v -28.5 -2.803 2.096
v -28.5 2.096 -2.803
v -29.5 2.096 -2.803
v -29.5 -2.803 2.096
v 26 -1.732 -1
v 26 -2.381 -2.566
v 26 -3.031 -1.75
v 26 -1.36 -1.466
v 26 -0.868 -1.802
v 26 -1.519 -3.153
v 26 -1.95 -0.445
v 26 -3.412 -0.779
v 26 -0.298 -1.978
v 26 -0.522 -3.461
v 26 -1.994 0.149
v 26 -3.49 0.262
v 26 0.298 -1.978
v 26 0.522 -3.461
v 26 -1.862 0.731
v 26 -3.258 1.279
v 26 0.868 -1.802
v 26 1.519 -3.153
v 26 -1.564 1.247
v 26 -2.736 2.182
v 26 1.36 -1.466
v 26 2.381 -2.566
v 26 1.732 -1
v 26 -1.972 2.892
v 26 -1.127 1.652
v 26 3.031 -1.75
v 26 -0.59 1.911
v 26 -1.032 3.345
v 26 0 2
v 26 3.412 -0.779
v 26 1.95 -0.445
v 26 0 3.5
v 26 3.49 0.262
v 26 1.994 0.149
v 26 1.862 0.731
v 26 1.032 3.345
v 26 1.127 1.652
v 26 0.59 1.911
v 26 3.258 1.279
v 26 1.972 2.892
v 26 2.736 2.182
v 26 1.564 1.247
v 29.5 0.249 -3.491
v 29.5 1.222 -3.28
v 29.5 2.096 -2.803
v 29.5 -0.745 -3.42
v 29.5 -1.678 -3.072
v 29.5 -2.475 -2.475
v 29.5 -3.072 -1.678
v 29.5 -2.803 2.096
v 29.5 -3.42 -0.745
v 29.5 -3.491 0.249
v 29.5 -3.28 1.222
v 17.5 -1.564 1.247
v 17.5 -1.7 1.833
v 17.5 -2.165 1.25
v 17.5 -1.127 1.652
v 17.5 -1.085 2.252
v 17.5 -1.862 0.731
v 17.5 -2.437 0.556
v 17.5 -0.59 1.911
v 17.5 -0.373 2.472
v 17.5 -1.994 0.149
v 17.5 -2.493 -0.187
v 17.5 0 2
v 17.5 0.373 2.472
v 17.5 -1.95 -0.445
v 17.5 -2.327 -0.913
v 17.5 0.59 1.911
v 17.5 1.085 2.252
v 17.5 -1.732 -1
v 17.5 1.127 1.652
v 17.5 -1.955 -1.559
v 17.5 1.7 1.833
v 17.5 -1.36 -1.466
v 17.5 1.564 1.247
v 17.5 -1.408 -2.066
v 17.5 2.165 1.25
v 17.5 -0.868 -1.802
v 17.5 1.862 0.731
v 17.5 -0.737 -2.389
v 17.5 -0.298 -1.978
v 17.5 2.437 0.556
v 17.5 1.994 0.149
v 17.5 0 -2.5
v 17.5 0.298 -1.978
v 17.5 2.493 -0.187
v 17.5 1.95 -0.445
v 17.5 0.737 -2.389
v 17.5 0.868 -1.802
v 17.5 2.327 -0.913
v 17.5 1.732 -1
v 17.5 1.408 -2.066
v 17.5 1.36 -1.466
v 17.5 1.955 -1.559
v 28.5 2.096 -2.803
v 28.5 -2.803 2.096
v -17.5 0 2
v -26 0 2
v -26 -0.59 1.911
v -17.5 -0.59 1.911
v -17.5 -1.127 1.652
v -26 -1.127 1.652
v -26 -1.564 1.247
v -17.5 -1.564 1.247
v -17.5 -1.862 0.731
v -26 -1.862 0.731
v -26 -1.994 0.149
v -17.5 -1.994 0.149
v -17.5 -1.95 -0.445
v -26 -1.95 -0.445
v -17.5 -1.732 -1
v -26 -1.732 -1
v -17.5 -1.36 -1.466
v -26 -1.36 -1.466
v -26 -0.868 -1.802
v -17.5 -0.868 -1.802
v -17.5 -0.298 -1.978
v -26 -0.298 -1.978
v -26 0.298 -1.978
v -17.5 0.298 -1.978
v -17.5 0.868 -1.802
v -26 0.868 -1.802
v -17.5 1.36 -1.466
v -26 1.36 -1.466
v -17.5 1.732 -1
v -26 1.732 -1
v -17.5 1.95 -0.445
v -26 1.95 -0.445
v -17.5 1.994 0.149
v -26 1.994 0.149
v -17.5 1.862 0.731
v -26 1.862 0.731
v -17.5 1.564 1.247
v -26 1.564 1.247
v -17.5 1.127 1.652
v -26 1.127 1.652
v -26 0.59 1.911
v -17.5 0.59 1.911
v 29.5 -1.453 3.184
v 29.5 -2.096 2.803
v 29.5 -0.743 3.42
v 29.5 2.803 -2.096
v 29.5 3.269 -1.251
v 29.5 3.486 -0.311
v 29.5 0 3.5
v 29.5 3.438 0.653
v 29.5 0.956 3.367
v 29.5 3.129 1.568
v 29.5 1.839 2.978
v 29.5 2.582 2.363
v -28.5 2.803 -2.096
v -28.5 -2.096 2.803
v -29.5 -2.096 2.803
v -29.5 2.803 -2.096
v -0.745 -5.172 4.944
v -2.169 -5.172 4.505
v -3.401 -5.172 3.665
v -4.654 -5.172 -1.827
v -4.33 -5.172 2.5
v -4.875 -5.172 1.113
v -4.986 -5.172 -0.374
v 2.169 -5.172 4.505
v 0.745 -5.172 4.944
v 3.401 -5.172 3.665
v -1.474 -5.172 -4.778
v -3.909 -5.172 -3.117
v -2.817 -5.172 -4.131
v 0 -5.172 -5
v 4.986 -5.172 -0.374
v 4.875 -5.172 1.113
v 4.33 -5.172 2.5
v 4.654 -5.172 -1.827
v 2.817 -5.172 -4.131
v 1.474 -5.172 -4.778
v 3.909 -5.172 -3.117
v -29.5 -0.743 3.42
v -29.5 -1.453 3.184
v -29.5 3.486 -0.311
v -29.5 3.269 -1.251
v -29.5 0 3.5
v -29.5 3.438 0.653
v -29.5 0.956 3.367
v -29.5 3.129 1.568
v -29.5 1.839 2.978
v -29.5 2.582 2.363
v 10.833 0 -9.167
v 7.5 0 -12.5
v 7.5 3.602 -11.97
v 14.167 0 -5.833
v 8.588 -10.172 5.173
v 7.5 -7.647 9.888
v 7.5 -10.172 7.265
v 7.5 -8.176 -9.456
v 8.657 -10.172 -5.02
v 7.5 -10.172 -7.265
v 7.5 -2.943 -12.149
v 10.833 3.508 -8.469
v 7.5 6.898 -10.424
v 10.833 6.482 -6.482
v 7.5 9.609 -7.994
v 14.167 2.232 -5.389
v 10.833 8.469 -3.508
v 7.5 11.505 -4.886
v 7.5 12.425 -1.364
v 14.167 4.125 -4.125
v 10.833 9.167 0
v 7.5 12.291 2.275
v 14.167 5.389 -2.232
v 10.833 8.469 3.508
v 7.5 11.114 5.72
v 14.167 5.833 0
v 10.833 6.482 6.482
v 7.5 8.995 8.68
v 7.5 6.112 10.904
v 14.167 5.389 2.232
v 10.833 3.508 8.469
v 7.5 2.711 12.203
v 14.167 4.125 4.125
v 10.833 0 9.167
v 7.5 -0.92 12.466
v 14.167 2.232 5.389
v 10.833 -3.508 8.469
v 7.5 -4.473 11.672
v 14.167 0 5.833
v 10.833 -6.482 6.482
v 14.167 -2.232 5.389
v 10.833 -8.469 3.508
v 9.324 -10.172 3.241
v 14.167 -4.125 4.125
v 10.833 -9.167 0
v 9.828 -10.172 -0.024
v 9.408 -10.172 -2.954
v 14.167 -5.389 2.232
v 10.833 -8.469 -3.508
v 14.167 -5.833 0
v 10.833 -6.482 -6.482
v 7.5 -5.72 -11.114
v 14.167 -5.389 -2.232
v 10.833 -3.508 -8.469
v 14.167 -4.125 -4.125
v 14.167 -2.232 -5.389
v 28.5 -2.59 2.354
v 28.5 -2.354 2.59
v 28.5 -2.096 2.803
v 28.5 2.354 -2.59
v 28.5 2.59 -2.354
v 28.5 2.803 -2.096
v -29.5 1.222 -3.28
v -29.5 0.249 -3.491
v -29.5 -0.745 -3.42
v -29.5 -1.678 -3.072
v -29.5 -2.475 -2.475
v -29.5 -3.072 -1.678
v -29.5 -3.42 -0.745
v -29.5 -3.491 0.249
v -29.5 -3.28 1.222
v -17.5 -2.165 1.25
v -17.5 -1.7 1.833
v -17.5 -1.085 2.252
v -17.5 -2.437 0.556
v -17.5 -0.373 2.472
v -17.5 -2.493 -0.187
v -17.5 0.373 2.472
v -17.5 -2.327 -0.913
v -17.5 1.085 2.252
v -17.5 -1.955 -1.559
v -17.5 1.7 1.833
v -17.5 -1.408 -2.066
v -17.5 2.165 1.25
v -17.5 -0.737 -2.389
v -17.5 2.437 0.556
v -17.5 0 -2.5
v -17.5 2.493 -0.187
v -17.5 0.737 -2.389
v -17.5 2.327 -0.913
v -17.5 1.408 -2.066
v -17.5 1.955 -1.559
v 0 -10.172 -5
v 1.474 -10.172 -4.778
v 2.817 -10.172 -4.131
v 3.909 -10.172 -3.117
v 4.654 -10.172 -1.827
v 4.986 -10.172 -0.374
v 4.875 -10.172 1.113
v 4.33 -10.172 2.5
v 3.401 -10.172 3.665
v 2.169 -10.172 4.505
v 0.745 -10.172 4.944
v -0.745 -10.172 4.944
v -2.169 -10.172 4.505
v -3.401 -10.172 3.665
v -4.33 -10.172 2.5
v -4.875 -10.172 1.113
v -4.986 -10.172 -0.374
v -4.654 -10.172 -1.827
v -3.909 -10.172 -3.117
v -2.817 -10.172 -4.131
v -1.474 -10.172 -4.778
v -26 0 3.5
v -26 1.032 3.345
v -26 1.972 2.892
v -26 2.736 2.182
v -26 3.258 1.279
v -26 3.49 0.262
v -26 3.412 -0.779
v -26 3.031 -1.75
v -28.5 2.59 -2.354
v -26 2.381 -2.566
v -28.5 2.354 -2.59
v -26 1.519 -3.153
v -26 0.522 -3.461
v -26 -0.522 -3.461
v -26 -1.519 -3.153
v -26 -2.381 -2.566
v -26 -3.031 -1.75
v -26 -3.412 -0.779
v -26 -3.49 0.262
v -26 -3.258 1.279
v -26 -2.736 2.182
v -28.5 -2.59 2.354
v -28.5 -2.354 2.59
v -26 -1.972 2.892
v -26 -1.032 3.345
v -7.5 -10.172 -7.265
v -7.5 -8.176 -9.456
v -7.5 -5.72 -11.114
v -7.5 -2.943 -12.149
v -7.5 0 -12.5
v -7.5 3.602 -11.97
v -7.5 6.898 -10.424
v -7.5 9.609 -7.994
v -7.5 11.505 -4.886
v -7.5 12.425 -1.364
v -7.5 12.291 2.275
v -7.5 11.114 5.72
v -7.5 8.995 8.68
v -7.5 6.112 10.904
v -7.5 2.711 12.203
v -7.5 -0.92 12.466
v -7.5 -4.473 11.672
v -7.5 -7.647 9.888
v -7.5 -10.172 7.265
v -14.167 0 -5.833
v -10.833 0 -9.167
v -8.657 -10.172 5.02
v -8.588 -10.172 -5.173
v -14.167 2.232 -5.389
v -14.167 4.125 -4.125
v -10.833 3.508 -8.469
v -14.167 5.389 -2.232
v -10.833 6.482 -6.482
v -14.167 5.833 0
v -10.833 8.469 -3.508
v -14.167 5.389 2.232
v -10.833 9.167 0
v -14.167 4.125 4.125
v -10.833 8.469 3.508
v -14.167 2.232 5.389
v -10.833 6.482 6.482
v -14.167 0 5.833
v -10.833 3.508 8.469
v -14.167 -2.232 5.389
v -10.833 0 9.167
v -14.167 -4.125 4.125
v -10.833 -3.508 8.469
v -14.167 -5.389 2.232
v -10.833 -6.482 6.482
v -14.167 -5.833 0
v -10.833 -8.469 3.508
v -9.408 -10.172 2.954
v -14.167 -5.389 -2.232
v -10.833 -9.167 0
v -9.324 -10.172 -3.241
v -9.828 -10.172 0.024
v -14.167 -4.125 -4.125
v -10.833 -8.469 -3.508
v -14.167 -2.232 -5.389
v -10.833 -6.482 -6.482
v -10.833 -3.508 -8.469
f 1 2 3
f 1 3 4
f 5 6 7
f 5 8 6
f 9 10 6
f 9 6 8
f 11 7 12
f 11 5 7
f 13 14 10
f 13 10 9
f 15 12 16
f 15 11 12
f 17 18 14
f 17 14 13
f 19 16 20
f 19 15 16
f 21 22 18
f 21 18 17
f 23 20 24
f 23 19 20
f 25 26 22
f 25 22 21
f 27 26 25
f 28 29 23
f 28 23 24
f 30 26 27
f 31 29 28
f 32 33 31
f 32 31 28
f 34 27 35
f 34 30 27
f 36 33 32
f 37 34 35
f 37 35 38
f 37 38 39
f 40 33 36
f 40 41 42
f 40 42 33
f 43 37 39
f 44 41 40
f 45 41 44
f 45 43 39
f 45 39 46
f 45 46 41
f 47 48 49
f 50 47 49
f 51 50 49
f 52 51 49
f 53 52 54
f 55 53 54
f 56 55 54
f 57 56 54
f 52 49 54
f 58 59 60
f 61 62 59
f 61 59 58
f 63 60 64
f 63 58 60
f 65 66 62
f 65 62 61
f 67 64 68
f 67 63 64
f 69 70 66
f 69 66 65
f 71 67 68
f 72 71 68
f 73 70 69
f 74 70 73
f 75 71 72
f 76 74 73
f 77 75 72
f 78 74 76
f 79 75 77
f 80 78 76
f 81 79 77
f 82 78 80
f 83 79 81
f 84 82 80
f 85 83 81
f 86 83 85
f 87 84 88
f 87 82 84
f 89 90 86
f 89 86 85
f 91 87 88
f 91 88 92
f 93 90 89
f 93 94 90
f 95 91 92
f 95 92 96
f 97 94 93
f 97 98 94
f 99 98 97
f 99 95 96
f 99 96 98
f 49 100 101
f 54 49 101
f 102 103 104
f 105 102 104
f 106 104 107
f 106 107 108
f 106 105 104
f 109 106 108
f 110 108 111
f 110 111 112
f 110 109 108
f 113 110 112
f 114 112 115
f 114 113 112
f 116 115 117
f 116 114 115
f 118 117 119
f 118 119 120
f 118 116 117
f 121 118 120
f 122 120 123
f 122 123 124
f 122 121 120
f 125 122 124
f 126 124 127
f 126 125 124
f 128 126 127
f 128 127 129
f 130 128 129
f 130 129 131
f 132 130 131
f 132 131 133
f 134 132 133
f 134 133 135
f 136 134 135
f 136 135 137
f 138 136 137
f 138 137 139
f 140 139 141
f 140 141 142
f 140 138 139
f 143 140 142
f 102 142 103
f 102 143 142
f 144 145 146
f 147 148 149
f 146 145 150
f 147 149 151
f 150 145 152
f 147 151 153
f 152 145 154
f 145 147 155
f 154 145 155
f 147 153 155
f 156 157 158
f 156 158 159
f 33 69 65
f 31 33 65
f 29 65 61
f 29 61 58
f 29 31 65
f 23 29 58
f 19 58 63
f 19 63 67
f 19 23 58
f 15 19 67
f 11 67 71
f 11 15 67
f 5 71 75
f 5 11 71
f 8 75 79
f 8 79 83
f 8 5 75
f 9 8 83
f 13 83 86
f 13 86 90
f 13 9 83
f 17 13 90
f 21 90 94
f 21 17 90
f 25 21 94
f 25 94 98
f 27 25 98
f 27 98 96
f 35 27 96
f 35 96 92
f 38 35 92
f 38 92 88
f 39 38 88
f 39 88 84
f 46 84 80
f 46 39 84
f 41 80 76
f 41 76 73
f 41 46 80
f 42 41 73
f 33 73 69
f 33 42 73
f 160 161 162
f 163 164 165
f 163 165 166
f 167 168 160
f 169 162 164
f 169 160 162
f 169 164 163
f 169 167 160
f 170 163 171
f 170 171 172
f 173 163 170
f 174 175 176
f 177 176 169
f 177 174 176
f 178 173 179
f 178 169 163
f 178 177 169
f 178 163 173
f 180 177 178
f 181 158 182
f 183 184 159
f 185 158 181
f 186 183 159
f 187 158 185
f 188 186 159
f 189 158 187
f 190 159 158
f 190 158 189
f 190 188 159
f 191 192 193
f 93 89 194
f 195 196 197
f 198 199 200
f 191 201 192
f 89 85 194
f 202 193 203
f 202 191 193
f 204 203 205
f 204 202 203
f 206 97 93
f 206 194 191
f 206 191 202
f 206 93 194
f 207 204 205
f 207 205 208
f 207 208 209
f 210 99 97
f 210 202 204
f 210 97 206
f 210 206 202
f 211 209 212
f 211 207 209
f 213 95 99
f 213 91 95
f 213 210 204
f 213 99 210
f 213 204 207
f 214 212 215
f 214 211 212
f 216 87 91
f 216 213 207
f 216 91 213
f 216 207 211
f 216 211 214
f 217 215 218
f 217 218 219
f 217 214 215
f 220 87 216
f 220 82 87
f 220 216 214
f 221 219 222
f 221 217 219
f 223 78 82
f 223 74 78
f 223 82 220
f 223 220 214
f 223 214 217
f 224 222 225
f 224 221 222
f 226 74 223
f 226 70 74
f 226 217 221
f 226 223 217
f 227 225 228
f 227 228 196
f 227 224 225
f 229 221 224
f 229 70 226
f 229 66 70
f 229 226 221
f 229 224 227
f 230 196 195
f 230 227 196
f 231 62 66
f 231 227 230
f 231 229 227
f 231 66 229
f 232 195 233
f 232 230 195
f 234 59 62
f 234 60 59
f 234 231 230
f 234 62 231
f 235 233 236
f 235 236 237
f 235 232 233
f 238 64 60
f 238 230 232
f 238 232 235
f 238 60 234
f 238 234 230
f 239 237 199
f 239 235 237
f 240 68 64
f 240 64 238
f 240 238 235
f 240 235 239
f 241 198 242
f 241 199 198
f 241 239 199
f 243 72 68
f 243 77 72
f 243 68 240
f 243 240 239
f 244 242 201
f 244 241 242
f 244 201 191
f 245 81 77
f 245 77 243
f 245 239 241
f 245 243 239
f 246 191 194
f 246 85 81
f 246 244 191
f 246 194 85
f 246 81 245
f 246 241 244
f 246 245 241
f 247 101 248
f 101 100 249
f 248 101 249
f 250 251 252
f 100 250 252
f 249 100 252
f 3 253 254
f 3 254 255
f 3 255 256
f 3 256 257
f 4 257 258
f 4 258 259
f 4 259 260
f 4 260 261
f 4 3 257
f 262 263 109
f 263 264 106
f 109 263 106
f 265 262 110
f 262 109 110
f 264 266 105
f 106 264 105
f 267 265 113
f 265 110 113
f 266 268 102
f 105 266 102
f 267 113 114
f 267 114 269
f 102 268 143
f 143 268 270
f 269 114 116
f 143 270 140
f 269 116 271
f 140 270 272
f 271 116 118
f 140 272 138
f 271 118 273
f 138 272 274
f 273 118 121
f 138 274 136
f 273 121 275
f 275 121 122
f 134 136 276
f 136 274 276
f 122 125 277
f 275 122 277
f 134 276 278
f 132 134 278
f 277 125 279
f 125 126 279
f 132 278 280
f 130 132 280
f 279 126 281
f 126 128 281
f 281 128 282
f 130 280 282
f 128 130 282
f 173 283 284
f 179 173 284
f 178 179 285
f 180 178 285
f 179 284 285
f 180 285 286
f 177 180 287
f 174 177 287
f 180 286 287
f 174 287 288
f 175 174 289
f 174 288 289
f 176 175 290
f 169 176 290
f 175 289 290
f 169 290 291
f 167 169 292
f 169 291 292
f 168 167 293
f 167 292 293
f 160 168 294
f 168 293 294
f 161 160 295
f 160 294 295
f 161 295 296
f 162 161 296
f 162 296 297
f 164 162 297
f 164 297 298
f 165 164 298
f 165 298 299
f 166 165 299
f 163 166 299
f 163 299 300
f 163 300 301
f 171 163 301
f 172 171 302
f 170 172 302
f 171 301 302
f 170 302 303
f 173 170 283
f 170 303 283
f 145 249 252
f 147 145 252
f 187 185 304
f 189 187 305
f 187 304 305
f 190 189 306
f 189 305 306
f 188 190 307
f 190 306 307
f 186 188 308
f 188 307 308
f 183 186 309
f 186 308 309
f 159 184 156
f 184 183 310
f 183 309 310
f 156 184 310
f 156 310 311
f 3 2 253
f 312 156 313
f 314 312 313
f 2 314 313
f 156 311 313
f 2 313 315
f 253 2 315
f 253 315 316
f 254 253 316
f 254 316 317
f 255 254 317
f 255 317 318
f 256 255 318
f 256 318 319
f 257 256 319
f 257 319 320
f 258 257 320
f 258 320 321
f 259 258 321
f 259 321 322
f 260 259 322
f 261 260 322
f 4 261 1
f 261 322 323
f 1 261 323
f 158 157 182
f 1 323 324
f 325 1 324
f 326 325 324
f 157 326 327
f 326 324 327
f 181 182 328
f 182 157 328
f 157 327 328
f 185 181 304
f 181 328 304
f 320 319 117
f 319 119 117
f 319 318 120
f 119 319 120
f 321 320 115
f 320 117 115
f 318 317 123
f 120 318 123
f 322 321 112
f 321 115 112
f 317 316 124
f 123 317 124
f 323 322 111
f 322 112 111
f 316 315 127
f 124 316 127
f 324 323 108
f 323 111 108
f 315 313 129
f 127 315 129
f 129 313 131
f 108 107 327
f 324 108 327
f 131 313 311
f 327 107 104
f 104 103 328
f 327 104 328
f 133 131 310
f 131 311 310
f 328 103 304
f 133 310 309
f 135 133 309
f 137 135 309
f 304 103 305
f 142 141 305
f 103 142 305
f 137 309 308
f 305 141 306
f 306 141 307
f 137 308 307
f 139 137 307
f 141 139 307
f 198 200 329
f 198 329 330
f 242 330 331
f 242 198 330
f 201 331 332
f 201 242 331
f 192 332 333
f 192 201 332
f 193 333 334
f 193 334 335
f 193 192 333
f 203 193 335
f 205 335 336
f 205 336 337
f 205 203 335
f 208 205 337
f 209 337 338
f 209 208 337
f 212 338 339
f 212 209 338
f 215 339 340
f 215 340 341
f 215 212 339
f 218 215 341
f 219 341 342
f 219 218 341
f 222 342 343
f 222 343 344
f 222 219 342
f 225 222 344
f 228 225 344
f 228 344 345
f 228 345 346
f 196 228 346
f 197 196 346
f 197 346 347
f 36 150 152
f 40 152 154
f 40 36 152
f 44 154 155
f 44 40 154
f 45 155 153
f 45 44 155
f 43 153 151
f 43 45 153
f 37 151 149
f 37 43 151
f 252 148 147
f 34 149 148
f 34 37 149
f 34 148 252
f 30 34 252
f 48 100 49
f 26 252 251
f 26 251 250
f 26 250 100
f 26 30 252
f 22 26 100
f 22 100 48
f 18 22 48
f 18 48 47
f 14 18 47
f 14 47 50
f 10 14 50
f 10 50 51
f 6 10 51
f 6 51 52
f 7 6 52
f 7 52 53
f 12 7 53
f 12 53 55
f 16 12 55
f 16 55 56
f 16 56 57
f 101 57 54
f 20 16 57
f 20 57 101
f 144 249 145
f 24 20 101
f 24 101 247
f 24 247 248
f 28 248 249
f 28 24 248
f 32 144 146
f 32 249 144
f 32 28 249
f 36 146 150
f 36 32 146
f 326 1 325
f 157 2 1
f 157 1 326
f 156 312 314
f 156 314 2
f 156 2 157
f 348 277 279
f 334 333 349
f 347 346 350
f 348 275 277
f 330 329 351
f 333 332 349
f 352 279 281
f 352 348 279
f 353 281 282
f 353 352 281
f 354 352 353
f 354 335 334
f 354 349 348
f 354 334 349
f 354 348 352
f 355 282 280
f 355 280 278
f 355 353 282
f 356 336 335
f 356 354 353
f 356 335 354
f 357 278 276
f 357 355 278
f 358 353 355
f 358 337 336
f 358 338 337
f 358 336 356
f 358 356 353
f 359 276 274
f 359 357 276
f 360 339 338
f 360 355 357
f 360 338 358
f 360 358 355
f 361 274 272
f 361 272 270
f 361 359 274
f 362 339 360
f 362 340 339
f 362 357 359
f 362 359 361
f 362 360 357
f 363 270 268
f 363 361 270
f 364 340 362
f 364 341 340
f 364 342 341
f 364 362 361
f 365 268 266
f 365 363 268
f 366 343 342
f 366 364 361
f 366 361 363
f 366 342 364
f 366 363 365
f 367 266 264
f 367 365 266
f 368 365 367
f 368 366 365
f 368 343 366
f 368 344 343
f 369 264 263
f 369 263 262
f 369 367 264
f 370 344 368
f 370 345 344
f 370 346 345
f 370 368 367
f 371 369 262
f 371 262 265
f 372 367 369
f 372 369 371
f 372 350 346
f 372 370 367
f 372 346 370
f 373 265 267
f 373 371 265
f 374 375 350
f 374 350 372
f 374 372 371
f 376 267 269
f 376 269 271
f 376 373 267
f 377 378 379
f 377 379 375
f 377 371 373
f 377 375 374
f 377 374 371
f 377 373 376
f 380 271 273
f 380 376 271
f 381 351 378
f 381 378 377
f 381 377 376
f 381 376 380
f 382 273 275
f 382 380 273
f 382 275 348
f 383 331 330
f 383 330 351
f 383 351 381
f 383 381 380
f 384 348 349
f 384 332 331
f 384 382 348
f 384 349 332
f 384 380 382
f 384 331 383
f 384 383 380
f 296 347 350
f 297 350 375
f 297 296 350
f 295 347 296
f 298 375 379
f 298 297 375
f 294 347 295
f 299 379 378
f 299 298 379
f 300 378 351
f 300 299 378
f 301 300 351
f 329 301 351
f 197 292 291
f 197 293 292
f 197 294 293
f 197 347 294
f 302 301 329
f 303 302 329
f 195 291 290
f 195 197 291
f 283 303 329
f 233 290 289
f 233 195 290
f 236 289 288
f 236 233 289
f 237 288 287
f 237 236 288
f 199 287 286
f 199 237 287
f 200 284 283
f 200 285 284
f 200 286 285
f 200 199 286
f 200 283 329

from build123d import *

# Parameters (mm, degrees)
SKETCH1_R           = 12.5
BOSS_EXTRUDE1_DEPTH = 17.5
SKETCH2_R           = 2
BOSS_EXTRUDE2_DEPTH = 26
CHAMFER1_SIZE       = 10
SKETCH3_W           = 28.997372317
SKETCH3_H           = 7.197339184
CUT_EXTRUDE1_DEPTH  = 20
SKETCH4_R           = 5
CUT_EXTRUDE2_DEPTH  = 5
SKETCH5_R           = 3.5
BOSS_EXTRUDE3_DEPTH = 3.5
CUT_EXTRUDE6_START  = -1
CUT_EXTRUDE6_DEPTH  = 1


with BuildPart() as part:
    # Sketch1 → Boss-Extrude1 (new, symmetric)
    with BuildSketch(Plane(origin=(0, 0, 0), x_dir=(0, 0, -1), z_dir=(1, 0, 0))):
        Circle(SKETCH1_R)
    extrude(amount=BOSS_EXTRUDE1_DEPTH, both=True)

    # Sketch2 → Boss-Extrude2 (add, symmetric)
    with BuildSketch(Plane(origin=(0, 0, 0), x_dir=(0, 0, -1), z_dir=(1, 0, 0))):
        with Locations(Location((0, 0, 0), (0, 0, 180))):
            Circle(SKETCH2_R)
    extrude(amount=BOSS_EXTRUDE2_DEPTH, both=True)

    # Chamfer1
    chamfer1_edges = [part.edges().sort_by_distance(p)[0] for p in [
        (-17.5, 0, 12.5),
        (17.5, 0, 12.5),
    ]]
    chamfer(chamfer1_edges, length=CHAMFER1_SIZE)

    # Sketch3 → Cut-Extrude1 (cut, symmetric)
    with BuildSketch(Plane(origin=(0, 0, 0), x_dir=(0, 0, -1), z_dir=(1, 0, 0))):
        with Locations((0.644848308, -13.770631617)):
            Rectangle(SKETCH3_W, SKETCH3_H)
    extrude(amount=CUT_EXTRUDE1_DEPTH, both=True, mode=Mode.SUBTRACT)

    # Sketch4 → Cut-Extrude2 (cut)
    with BuildSketch(Plane.XZ.offset(10.171962025)):
        with Locations(Location((0, 0, 0), (0, 0, 270))):
            Circle(SKETCH4_R)
    extrude(amount=-CUT_EXTRUDE2_DEPTH, mode=Mode.SUBTRACT)

    # Sketch5 → Boss-Extrude3 (add)
    with BuildSketch(Plane.ZY.offset(26)):
        Circle(SKETCH5_R)
    boss_extrude3 = extrude(amount=BOSS_EXTRUDE3_DEPTH)

    # Sketch6 → Cut-Extrude6 (cut)
    with BuildSketch(Plane.ZY.offset(29.5).offset(CUT_EXTRUDE6_START)):
        with BuildLine():
            Line((2.803043133, -2.095936352), (-2.095936352, 2.803043133))
            ThreePointArc((-2.095936352, 2.803043133), (-2.474873734, 2.474873734), (-2.803043133, 2.095936352))
            Line((-2.803043133, 2.095936352), (2.095936352, -2.803043133))
            ThreePointArc((2.095936352, -2.803043133), (2.474873734, -2.474873734), (2.803043133, -2.095936352))
        make_face()
    cut_extrude6 = extrude(amount=CUT_EXTRUDE6_DEPTH, mode=Mode.SUBTRACT)

    # Mirror1: Boss-Extrude3, Cut-Extrude6 across plane
    add(boss_extrude3.mirror(Plane(origin=(0, 0, 0), x_dir=(0, 0, 1), z_dir=(1, 0, 0))))
    add(cut_extrude6.mirror(Plane(origin=(0, 0, 0), x_dir=(0, 0, 1), z_dir=(1, 0, 0))), mode=Mode.SUBTRACT)


solid = part.part
